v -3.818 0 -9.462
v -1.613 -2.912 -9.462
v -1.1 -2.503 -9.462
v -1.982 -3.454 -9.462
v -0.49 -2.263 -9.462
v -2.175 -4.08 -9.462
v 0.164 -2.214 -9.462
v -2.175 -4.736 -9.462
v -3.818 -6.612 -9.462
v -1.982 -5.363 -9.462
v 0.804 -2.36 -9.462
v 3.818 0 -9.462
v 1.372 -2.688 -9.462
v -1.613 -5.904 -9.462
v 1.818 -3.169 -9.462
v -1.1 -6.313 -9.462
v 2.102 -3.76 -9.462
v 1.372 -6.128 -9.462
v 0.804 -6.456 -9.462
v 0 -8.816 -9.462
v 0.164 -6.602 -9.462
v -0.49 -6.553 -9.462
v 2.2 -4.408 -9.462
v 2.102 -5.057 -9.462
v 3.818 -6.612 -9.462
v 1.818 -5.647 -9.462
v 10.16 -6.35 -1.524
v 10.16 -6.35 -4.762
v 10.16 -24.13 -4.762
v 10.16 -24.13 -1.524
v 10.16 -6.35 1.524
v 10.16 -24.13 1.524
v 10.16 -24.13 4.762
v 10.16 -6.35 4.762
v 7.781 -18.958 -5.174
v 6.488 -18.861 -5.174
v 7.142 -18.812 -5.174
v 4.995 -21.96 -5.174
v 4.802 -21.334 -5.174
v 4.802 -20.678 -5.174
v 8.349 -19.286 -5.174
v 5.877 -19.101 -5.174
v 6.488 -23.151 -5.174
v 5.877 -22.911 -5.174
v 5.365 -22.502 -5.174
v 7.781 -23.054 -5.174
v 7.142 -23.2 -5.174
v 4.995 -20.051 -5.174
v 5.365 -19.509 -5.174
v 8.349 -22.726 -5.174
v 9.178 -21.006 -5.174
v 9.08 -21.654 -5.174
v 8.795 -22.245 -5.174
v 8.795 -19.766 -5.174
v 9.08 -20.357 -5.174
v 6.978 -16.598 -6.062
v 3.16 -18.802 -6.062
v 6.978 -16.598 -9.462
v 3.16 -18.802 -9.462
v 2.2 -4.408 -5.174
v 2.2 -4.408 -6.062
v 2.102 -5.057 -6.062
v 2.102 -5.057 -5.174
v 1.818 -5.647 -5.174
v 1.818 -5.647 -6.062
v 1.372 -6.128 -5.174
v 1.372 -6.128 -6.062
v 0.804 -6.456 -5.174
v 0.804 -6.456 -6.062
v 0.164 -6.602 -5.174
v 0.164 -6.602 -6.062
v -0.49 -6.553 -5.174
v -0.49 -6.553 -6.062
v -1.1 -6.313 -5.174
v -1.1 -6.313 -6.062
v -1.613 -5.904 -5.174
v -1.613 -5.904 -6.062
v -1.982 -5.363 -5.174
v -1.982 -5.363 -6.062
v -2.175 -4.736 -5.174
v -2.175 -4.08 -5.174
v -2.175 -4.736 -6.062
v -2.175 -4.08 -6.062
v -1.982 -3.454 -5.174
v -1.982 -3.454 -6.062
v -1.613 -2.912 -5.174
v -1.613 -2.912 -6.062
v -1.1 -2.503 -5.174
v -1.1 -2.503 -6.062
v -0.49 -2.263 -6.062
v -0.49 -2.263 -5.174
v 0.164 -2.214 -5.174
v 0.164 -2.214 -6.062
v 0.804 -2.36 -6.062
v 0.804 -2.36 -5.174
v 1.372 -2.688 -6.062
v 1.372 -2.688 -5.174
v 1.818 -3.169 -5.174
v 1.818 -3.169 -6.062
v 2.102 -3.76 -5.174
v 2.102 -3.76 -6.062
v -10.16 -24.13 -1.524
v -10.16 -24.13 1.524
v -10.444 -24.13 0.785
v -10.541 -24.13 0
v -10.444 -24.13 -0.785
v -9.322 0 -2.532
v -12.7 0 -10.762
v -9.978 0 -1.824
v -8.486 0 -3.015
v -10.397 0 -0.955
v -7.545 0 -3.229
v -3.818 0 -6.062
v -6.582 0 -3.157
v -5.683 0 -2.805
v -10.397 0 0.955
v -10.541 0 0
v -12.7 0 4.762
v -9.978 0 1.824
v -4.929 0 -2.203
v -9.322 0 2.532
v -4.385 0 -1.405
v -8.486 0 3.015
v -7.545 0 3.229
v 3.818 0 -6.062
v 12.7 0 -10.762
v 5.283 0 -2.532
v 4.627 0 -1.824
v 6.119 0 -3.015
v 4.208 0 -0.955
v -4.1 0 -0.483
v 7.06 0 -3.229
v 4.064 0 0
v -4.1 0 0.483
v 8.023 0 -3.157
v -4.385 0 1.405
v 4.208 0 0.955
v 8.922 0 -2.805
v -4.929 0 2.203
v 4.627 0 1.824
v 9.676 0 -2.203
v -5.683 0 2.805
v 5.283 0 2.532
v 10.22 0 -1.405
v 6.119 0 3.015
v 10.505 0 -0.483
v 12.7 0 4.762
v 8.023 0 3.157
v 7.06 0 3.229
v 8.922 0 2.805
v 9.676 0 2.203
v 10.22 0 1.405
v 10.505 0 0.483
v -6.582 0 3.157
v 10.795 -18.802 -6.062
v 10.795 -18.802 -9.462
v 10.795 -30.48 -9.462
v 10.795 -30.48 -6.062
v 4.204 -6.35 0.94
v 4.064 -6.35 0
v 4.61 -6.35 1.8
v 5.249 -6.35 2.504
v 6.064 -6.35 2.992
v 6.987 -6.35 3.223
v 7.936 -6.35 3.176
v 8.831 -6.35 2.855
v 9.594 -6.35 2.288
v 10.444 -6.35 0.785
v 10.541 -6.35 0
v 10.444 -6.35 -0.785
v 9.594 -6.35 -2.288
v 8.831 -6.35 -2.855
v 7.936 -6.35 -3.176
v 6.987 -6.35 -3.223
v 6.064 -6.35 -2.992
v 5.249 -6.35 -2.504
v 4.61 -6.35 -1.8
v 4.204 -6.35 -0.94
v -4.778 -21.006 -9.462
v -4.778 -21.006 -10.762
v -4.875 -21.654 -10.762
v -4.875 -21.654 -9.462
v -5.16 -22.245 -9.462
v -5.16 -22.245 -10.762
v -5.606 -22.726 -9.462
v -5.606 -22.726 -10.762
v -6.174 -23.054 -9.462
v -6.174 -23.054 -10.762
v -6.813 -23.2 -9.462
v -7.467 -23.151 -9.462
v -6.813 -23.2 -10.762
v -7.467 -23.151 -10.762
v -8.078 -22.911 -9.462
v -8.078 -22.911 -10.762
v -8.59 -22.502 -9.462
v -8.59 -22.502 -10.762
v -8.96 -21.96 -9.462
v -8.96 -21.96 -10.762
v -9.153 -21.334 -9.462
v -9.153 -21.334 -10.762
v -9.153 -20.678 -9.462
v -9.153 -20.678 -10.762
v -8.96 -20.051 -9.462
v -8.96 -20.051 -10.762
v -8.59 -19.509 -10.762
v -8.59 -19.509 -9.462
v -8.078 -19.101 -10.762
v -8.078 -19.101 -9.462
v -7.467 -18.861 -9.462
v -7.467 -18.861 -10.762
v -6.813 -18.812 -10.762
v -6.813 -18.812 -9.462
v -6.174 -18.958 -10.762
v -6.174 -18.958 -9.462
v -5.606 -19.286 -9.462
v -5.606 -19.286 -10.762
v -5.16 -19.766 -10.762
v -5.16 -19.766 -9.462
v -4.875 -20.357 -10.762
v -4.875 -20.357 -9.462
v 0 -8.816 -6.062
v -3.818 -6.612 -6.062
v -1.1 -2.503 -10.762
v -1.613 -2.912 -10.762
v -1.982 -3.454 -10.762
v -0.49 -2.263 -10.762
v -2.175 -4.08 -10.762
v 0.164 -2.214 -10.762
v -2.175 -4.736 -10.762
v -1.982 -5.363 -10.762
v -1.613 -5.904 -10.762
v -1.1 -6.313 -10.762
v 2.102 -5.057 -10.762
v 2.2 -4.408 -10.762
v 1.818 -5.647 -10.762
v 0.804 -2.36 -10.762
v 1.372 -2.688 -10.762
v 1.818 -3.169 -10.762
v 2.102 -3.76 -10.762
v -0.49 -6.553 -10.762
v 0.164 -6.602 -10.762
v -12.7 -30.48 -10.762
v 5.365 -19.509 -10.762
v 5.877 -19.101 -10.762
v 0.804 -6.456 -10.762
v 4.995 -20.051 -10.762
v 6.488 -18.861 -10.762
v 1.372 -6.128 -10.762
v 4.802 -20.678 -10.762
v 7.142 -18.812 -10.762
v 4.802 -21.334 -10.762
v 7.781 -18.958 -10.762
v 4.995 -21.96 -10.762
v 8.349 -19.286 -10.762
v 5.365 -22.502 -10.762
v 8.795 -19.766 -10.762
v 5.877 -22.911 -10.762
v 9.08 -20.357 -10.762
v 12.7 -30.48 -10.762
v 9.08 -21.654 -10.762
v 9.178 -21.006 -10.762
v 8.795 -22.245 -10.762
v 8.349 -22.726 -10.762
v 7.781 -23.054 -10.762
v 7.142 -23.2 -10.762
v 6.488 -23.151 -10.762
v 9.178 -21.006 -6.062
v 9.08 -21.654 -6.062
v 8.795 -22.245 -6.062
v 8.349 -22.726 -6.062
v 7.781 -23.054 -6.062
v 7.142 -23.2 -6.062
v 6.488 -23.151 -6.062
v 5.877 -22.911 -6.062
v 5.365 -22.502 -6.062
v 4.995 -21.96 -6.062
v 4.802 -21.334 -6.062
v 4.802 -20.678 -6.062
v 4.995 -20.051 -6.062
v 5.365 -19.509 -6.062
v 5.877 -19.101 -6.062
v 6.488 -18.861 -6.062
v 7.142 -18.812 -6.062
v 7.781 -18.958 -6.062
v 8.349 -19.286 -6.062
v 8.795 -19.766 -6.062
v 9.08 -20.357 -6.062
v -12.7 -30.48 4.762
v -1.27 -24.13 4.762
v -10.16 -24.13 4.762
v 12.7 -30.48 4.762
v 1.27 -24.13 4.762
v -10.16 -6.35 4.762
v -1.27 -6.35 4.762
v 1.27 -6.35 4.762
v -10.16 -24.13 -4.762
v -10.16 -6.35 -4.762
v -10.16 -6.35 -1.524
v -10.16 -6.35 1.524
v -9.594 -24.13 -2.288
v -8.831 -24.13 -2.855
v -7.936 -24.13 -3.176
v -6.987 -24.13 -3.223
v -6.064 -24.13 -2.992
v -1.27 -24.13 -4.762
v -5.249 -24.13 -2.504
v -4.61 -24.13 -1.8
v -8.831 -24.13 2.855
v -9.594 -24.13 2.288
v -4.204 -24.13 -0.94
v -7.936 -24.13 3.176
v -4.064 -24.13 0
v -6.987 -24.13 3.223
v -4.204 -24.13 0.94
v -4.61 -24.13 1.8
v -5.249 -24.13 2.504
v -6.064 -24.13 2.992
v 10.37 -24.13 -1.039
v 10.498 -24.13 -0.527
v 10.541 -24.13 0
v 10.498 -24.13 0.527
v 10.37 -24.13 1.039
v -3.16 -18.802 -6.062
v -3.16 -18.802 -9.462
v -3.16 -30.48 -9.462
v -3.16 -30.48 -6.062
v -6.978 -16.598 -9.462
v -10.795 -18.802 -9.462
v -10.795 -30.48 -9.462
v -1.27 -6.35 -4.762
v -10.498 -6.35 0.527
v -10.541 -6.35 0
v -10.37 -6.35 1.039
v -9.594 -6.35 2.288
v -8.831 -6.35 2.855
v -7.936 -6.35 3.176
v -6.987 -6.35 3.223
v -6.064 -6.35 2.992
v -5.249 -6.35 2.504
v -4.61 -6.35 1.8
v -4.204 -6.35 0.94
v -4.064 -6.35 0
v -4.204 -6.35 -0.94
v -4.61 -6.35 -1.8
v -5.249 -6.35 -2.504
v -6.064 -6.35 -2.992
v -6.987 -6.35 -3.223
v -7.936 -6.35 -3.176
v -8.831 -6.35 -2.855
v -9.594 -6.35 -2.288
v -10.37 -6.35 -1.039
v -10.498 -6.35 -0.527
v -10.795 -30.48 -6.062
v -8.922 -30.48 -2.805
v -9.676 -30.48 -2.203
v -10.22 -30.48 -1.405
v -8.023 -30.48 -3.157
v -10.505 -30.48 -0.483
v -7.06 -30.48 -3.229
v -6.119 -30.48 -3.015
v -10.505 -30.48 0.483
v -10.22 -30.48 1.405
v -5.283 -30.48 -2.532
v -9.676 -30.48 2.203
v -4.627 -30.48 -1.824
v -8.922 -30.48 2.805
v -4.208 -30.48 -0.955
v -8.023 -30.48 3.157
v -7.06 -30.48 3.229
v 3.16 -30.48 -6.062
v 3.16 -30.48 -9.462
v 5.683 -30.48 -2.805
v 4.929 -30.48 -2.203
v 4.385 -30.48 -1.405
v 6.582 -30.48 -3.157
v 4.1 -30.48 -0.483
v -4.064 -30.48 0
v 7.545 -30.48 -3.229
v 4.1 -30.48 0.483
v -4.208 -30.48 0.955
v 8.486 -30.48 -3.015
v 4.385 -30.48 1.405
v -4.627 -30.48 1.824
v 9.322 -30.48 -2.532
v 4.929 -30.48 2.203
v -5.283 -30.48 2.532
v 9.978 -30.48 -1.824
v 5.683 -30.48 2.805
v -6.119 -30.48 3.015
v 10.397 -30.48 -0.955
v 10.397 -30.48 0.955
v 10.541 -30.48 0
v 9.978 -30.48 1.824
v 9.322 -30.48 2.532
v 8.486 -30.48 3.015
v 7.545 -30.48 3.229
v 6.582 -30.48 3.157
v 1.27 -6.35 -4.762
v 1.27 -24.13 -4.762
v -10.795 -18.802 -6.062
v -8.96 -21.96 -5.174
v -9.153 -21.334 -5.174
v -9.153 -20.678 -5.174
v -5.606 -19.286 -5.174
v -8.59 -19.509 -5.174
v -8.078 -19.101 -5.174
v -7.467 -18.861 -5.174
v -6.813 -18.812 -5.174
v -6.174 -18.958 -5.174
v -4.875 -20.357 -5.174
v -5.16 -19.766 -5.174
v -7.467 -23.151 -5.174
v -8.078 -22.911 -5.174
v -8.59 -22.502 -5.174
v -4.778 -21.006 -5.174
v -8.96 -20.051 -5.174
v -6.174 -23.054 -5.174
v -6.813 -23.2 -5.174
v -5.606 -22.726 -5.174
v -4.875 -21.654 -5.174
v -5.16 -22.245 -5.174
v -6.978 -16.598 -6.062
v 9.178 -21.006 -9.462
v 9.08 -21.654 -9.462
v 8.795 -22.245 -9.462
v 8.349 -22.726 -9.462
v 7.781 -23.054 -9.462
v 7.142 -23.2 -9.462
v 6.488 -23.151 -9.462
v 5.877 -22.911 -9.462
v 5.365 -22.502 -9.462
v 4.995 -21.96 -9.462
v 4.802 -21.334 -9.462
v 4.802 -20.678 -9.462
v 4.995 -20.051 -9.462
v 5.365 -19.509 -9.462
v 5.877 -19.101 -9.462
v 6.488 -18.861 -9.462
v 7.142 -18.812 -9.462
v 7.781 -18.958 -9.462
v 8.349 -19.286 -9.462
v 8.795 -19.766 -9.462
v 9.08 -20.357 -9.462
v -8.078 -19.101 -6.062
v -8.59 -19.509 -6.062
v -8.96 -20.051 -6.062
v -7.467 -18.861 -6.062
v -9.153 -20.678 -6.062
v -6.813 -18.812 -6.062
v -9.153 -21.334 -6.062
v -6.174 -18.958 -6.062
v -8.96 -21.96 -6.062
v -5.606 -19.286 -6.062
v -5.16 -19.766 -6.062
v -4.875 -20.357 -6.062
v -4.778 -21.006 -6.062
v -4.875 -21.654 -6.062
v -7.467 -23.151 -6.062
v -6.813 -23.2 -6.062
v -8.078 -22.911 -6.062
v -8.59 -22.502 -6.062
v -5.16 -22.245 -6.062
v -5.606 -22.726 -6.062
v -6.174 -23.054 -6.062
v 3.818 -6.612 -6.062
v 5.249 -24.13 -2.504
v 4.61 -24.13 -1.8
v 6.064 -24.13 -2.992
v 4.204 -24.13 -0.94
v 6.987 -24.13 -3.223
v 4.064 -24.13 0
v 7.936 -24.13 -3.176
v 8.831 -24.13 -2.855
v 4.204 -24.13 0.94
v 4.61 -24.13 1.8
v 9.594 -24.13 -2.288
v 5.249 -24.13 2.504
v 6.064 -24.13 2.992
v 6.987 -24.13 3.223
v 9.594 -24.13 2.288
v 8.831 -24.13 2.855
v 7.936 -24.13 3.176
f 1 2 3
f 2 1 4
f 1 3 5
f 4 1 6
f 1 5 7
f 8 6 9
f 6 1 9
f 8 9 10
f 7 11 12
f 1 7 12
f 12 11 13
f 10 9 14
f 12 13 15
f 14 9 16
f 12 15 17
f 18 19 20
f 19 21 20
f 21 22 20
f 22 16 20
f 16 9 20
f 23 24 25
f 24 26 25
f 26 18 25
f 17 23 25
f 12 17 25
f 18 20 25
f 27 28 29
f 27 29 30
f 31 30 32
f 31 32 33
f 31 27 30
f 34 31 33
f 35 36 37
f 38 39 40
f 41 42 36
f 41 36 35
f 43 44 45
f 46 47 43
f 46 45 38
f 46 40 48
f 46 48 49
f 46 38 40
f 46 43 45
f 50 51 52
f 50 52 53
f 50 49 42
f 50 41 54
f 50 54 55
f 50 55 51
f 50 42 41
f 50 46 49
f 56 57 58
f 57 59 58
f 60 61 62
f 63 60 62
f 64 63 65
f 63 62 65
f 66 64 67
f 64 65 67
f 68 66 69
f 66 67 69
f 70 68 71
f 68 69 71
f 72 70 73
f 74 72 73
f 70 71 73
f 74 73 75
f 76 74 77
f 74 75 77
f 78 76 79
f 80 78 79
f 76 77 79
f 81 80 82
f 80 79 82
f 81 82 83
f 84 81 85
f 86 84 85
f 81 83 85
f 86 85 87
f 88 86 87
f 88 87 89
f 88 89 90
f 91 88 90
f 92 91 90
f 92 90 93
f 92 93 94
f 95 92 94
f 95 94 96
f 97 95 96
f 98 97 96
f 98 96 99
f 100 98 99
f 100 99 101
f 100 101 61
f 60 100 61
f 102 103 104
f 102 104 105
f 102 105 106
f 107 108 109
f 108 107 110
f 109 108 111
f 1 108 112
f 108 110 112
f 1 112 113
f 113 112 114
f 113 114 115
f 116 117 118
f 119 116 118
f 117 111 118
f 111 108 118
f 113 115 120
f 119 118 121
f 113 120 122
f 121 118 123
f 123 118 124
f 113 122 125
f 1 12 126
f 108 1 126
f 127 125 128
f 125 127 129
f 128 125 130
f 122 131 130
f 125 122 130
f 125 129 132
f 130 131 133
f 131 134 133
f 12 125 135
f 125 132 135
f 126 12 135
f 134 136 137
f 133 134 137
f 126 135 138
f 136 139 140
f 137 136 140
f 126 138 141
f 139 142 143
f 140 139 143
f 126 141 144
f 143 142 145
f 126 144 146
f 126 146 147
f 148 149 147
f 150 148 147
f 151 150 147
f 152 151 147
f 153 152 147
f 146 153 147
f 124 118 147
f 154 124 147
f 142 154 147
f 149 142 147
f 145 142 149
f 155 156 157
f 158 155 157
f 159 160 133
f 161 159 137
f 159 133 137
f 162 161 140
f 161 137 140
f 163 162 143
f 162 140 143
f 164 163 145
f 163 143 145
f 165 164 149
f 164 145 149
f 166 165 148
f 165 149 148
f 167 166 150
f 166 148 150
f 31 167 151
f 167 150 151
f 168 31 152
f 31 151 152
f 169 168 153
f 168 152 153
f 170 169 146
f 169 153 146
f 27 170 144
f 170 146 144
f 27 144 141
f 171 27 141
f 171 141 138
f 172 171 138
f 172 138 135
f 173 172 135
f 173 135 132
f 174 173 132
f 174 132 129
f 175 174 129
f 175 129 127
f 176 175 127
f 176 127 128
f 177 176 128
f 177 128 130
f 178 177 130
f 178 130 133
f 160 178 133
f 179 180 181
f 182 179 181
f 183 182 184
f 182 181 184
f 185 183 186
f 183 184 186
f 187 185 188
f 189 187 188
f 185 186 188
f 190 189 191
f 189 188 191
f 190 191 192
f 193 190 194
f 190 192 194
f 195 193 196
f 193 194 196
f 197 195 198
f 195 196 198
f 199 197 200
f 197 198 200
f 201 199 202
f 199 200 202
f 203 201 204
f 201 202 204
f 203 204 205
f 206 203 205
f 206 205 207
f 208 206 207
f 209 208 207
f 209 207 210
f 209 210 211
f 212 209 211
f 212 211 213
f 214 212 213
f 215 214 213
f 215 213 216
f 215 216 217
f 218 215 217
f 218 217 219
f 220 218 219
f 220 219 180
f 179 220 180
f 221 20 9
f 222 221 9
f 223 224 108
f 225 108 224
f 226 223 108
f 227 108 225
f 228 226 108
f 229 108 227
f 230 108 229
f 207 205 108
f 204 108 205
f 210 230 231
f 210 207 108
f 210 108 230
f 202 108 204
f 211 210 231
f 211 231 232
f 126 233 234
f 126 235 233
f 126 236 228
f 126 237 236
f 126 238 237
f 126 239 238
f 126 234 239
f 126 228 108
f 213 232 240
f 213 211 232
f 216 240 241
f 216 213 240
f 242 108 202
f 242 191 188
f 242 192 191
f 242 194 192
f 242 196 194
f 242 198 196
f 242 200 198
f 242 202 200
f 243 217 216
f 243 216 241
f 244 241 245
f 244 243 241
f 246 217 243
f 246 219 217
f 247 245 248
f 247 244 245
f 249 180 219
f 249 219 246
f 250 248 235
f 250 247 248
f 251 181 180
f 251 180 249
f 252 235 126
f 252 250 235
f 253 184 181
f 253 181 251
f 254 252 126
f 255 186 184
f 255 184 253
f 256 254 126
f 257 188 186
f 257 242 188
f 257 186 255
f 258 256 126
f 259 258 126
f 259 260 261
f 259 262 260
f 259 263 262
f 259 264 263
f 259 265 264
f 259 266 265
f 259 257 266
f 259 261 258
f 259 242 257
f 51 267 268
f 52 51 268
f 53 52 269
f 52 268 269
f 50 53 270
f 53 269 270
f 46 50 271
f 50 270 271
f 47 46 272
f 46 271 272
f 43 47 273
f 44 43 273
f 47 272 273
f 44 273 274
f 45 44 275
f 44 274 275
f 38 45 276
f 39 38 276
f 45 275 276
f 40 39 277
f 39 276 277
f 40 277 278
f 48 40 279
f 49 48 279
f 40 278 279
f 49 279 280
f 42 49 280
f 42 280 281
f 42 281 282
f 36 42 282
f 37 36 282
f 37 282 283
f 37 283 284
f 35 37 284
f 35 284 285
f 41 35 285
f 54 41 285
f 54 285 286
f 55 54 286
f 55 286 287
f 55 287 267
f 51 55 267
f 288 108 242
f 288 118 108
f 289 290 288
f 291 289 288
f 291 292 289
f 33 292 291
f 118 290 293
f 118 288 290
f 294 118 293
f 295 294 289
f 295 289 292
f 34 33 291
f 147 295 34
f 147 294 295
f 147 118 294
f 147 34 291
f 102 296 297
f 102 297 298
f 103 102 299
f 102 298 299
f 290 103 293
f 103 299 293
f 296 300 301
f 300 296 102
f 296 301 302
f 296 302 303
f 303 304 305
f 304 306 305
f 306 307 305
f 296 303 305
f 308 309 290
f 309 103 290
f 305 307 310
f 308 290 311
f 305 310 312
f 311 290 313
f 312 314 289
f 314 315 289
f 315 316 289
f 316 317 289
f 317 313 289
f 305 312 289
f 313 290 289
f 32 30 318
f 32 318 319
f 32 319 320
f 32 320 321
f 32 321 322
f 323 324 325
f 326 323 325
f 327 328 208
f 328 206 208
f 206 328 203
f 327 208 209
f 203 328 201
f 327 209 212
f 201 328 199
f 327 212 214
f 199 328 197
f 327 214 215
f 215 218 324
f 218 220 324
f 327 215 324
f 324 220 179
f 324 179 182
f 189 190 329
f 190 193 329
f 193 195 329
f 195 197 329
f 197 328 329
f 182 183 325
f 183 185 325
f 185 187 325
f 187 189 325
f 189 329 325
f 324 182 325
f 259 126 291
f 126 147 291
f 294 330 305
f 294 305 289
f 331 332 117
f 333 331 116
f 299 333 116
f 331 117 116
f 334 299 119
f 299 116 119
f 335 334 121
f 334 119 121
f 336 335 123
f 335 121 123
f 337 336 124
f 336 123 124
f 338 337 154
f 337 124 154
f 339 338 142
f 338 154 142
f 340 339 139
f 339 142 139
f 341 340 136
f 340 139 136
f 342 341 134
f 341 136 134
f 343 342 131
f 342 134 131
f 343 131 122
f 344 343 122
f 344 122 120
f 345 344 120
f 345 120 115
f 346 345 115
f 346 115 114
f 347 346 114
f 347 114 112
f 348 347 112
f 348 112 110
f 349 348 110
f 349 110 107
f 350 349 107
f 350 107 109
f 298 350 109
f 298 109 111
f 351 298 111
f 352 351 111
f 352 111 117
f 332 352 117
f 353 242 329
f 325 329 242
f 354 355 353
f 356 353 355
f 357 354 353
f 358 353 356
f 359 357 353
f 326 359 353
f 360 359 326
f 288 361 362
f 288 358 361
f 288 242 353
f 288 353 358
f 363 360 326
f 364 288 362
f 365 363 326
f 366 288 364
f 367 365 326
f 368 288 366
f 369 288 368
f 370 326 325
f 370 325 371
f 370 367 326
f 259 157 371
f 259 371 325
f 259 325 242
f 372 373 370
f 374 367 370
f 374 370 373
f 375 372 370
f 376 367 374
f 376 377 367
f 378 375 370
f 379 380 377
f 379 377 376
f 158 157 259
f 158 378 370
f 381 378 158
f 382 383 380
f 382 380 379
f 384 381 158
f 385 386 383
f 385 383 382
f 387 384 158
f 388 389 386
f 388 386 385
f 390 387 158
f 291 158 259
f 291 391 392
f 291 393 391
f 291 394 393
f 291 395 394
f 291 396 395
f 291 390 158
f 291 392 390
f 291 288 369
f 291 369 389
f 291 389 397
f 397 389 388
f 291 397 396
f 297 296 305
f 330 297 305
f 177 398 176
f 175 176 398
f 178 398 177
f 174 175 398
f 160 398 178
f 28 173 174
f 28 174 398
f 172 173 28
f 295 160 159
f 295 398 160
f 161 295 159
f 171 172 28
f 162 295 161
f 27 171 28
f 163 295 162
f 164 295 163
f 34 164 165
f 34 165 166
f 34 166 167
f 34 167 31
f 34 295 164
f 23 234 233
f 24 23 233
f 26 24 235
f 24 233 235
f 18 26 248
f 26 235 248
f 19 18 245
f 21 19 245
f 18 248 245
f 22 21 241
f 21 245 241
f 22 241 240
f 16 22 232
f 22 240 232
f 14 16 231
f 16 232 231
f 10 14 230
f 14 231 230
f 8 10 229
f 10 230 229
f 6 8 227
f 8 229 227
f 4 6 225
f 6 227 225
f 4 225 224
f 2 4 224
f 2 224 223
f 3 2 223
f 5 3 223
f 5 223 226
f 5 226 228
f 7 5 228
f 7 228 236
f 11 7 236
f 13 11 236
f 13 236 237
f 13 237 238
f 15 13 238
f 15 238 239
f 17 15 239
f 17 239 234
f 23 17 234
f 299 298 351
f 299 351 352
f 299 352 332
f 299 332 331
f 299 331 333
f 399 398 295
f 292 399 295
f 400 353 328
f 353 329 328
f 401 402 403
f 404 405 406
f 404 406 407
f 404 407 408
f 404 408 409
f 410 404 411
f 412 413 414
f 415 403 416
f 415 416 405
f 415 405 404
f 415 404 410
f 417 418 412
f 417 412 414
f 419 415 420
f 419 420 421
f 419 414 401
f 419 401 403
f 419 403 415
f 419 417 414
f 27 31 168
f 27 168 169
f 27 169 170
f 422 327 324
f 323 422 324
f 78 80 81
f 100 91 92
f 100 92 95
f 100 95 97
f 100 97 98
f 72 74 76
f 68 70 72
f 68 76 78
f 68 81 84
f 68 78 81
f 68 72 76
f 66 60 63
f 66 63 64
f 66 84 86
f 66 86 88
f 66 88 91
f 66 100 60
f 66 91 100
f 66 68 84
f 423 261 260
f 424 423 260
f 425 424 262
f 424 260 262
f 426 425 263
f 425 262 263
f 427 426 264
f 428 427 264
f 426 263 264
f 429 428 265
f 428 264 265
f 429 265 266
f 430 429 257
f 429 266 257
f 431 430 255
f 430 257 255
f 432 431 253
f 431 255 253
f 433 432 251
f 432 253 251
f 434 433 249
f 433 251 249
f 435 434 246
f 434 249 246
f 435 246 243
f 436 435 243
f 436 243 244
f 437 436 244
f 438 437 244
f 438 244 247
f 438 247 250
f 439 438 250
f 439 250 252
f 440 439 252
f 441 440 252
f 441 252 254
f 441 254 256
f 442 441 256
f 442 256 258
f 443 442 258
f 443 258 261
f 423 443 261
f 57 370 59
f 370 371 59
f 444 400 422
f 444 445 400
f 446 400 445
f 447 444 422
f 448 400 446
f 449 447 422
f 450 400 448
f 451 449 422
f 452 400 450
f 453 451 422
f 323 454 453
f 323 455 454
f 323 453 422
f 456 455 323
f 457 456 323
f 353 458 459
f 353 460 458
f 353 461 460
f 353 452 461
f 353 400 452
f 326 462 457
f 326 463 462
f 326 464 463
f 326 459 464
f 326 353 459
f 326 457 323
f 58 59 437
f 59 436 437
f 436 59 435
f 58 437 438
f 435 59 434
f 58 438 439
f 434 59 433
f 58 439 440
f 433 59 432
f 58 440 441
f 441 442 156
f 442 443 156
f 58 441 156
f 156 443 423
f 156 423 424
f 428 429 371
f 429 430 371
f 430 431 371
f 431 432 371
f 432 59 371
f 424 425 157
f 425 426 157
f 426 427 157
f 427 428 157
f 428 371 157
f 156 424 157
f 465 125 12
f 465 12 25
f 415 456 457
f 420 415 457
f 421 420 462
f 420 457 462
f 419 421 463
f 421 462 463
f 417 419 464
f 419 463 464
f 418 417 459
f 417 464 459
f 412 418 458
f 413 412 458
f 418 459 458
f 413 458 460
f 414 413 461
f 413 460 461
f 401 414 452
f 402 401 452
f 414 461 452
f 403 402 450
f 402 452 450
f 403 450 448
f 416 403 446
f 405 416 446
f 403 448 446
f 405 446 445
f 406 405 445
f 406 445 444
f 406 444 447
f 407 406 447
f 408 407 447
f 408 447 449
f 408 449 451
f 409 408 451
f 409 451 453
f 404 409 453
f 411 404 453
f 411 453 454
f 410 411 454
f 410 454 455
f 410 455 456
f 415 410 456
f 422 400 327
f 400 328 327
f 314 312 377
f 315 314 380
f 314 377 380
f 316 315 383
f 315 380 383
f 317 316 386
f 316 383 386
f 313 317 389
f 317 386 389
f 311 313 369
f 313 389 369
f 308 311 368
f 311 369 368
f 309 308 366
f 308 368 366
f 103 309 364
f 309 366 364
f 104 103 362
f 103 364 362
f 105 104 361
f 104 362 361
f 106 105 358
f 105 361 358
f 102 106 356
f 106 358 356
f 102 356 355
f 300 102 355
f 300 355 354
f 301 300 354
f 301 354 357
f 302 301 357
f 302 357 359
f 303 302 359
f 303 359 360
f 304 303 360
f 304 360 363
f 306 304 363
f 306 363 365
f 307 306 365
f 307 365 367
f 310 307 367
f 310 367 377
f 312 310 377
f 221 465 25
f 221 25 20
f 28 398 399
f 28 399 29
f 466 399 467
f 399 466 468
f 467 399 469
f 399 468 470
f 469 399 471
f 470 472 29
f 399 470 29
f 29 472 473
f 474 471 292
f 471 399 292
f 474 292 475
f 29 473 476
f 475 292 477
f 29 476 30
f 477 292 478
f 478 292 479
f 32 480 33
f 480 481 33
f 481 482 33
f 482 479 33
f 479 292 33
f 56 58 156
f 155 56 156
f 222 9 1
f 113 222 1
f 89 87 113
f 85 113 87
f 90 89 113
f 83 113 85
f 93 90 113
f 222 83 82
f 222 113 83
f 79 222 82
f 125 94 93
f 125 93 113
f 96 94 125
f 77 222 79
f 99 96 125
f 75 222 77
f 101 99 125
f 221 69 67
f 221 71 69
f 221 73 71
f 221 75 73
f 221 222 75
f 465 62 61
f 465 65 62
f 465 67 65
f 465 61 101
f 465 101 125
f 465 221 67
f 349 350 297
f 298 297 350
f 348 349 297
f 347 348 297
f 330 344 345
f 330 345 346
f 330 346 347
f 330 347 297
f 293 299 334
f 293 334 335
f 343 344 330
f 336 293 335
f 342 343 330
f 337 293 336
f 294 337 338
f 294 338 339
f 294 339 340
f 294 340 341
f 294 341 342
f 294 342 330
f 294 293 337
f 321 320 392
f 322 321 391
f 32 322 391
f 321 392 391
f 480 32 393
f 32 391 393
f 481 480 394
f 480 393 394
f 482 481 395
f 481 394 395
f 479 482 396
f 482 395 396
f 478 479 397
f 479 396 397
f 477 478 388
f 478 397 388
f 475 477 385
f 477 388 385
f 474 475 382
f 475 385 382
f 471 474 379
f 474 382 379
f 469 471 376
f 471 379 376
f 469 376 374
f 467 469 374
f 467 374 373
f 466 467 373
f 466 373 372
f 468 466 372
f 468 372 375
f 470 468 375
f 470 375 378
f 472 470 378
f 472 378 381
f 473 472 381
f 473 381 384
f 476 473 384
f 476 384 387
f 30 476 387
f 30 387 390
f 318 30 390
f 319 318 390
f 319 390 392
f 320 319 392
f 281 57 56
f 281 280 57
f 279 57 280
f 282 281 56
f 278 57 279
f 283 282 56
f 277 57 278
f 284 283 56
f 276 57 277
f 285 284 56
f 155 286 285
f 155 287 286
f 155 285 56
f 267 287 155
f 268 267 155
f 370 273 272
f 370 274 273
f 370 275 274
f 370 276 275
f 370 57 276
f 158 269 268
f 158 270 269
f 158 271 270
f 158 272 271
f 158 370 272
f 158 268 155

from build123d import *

# Parameters (mm, degrees)
F0_W           = 25.4
F0_H           = 9.525
F1_DEPTH       = 6.35
F2_W           = 2.54
F2_H           = 9.525
F3_DEPTH       = 17.78
F4_W           = 25.4
F4_H           = 9.525
F5_DEPTH       = 6.35
F6_R           = 3.2385
F7_DEPTH       = 6.35
F8_R           = 3.2385
F9_DEPTH       = 6.35
F10_W          = 25.4
F10_H          = 30.48
F11_DEPTH      = 6
F14_DEPTH      = 1.7
F14_DEPTH_BACK = 1.7
F15_R          = 2.2
F16_DEPTH      = 5.588


with BuildPart() as f1:
    # F0 (on Front) → F1 (new body)
    with BuildSketch(Plane.XZ):
        Rectangle(F0_W, F0_H)
    extrude(amount=F1_DEPTH)

    # F2 (on face) → F3 (join)
    with BuildSketch(Plane.XZ.offset(6.35)):
        with Locations((-11.43, 0)):
            Rectangle(F2_W, F2_H)
        Rectangle(F2_W, F2_H)
        with Locations((11.43, 0)):
            Rectangle(F2_W, F2_H)
    extrude(amount=F3_DEPTH)

    # F4 (on face) → F5 (join)
    with BuildSketch(Plane.XZ.offset(24.13)):
        Rectangle(F4_W, F4_H)
    extrude(amount=F5_DEPTH)

    # F6 (on face) → F7 (cut, through all)
    with BuildSketch(Plane(origin=(0, 0, 0), x_dir=(-1, 0, 0), z_dir=(0, 1, 0))):
        with Locations((7.3025, 0)):
            Circle(F6_R)
        with Locations((-7.3025, 0)):
            Circle(F6_R)
    extrude(amount=-F7_DEPTH, mode=Mode.SUBTRACT)

    # F8 (on face) → F9 (cut, through all)
    with BuildSketch(Plane.XZ.offset(30.48)):
        with Locations((-7.3025, 0)):
            Circle(F8_R)
        with Locations((7.3025, 0)):
            Circle(F8_R)
    extrude(amount=-F9_DEPTH, mode=Mode.SUBTRACT)

    # F10 (on face) → F11 (join)
    with BuildSketch(Plane(origin=(0, 0, -4.7625), x_dir=(1, 0, 0), z_dir=(0, 0, -1))):
        with Locations((0, 15.24)):
            Rectangle(F10_W, F10_H)
    extrude(amount=F11_DEPTH)

    # F13 (on offset) → F14 (cut, two sides)
    with BuildSketch(Plane(origin=(0, 0, -7.7625), x_dir=(1, 0, 0), z_dir=(0, 0, -1))) as f14_sk:
        Polygon((-3.16, 18.8017653474), (-3.16, 23.2098346526), (-3.16, 30.48), (-10.795, 30.48), (-10.795, 23.2098346526), (-10.795, 18.8017653474), (-6.9775, 16.5977306947), align=None)
        Polygon((10.795, 18.8017653474), (10.795, 23.2098346526), (10.795, 30.48), (3.16, 30.48), (3.16, 23.2098346526), (3.16, 18.8017653474), (6.9775, 16.5977306947), align=None)
        Polygon((3.8175, 2.2040346526), (3.8175, 6.6121039579), (0, 8.8161386105), (-3.8175, 6.6121039579), (-3.8175, 2.2040346526), (-3.8175, -0.0115306947), (3.8175, -0.0115306947), align=None)
    extrude(amount=-F14_DEPTH, mode=Mode.SUBTRACT)
    extrude(f14_sk.sketch, amount=F14_DEPTH_BACK, mode=Mode.SUBTRACT)

    # F15 (on face) → F16 (cut)
    with BuildSketch(Plane(origin=(0, 0, -10.7625), x_dir=(1, 0, 0), z_dir=(0, 0, -1))):
        with Locations((0, 4.4080693053)):
            Circle(F15_R)
        with Locations((6.9775, 21.0058)):
            Circle(F15_R)
        with Locations((-6.9775, 21.0058)):
            Circle(F15_R)
    extrude(amount=-F16_DEPTH, mode=Mode.SUBTRACT)


solid = f1.part
